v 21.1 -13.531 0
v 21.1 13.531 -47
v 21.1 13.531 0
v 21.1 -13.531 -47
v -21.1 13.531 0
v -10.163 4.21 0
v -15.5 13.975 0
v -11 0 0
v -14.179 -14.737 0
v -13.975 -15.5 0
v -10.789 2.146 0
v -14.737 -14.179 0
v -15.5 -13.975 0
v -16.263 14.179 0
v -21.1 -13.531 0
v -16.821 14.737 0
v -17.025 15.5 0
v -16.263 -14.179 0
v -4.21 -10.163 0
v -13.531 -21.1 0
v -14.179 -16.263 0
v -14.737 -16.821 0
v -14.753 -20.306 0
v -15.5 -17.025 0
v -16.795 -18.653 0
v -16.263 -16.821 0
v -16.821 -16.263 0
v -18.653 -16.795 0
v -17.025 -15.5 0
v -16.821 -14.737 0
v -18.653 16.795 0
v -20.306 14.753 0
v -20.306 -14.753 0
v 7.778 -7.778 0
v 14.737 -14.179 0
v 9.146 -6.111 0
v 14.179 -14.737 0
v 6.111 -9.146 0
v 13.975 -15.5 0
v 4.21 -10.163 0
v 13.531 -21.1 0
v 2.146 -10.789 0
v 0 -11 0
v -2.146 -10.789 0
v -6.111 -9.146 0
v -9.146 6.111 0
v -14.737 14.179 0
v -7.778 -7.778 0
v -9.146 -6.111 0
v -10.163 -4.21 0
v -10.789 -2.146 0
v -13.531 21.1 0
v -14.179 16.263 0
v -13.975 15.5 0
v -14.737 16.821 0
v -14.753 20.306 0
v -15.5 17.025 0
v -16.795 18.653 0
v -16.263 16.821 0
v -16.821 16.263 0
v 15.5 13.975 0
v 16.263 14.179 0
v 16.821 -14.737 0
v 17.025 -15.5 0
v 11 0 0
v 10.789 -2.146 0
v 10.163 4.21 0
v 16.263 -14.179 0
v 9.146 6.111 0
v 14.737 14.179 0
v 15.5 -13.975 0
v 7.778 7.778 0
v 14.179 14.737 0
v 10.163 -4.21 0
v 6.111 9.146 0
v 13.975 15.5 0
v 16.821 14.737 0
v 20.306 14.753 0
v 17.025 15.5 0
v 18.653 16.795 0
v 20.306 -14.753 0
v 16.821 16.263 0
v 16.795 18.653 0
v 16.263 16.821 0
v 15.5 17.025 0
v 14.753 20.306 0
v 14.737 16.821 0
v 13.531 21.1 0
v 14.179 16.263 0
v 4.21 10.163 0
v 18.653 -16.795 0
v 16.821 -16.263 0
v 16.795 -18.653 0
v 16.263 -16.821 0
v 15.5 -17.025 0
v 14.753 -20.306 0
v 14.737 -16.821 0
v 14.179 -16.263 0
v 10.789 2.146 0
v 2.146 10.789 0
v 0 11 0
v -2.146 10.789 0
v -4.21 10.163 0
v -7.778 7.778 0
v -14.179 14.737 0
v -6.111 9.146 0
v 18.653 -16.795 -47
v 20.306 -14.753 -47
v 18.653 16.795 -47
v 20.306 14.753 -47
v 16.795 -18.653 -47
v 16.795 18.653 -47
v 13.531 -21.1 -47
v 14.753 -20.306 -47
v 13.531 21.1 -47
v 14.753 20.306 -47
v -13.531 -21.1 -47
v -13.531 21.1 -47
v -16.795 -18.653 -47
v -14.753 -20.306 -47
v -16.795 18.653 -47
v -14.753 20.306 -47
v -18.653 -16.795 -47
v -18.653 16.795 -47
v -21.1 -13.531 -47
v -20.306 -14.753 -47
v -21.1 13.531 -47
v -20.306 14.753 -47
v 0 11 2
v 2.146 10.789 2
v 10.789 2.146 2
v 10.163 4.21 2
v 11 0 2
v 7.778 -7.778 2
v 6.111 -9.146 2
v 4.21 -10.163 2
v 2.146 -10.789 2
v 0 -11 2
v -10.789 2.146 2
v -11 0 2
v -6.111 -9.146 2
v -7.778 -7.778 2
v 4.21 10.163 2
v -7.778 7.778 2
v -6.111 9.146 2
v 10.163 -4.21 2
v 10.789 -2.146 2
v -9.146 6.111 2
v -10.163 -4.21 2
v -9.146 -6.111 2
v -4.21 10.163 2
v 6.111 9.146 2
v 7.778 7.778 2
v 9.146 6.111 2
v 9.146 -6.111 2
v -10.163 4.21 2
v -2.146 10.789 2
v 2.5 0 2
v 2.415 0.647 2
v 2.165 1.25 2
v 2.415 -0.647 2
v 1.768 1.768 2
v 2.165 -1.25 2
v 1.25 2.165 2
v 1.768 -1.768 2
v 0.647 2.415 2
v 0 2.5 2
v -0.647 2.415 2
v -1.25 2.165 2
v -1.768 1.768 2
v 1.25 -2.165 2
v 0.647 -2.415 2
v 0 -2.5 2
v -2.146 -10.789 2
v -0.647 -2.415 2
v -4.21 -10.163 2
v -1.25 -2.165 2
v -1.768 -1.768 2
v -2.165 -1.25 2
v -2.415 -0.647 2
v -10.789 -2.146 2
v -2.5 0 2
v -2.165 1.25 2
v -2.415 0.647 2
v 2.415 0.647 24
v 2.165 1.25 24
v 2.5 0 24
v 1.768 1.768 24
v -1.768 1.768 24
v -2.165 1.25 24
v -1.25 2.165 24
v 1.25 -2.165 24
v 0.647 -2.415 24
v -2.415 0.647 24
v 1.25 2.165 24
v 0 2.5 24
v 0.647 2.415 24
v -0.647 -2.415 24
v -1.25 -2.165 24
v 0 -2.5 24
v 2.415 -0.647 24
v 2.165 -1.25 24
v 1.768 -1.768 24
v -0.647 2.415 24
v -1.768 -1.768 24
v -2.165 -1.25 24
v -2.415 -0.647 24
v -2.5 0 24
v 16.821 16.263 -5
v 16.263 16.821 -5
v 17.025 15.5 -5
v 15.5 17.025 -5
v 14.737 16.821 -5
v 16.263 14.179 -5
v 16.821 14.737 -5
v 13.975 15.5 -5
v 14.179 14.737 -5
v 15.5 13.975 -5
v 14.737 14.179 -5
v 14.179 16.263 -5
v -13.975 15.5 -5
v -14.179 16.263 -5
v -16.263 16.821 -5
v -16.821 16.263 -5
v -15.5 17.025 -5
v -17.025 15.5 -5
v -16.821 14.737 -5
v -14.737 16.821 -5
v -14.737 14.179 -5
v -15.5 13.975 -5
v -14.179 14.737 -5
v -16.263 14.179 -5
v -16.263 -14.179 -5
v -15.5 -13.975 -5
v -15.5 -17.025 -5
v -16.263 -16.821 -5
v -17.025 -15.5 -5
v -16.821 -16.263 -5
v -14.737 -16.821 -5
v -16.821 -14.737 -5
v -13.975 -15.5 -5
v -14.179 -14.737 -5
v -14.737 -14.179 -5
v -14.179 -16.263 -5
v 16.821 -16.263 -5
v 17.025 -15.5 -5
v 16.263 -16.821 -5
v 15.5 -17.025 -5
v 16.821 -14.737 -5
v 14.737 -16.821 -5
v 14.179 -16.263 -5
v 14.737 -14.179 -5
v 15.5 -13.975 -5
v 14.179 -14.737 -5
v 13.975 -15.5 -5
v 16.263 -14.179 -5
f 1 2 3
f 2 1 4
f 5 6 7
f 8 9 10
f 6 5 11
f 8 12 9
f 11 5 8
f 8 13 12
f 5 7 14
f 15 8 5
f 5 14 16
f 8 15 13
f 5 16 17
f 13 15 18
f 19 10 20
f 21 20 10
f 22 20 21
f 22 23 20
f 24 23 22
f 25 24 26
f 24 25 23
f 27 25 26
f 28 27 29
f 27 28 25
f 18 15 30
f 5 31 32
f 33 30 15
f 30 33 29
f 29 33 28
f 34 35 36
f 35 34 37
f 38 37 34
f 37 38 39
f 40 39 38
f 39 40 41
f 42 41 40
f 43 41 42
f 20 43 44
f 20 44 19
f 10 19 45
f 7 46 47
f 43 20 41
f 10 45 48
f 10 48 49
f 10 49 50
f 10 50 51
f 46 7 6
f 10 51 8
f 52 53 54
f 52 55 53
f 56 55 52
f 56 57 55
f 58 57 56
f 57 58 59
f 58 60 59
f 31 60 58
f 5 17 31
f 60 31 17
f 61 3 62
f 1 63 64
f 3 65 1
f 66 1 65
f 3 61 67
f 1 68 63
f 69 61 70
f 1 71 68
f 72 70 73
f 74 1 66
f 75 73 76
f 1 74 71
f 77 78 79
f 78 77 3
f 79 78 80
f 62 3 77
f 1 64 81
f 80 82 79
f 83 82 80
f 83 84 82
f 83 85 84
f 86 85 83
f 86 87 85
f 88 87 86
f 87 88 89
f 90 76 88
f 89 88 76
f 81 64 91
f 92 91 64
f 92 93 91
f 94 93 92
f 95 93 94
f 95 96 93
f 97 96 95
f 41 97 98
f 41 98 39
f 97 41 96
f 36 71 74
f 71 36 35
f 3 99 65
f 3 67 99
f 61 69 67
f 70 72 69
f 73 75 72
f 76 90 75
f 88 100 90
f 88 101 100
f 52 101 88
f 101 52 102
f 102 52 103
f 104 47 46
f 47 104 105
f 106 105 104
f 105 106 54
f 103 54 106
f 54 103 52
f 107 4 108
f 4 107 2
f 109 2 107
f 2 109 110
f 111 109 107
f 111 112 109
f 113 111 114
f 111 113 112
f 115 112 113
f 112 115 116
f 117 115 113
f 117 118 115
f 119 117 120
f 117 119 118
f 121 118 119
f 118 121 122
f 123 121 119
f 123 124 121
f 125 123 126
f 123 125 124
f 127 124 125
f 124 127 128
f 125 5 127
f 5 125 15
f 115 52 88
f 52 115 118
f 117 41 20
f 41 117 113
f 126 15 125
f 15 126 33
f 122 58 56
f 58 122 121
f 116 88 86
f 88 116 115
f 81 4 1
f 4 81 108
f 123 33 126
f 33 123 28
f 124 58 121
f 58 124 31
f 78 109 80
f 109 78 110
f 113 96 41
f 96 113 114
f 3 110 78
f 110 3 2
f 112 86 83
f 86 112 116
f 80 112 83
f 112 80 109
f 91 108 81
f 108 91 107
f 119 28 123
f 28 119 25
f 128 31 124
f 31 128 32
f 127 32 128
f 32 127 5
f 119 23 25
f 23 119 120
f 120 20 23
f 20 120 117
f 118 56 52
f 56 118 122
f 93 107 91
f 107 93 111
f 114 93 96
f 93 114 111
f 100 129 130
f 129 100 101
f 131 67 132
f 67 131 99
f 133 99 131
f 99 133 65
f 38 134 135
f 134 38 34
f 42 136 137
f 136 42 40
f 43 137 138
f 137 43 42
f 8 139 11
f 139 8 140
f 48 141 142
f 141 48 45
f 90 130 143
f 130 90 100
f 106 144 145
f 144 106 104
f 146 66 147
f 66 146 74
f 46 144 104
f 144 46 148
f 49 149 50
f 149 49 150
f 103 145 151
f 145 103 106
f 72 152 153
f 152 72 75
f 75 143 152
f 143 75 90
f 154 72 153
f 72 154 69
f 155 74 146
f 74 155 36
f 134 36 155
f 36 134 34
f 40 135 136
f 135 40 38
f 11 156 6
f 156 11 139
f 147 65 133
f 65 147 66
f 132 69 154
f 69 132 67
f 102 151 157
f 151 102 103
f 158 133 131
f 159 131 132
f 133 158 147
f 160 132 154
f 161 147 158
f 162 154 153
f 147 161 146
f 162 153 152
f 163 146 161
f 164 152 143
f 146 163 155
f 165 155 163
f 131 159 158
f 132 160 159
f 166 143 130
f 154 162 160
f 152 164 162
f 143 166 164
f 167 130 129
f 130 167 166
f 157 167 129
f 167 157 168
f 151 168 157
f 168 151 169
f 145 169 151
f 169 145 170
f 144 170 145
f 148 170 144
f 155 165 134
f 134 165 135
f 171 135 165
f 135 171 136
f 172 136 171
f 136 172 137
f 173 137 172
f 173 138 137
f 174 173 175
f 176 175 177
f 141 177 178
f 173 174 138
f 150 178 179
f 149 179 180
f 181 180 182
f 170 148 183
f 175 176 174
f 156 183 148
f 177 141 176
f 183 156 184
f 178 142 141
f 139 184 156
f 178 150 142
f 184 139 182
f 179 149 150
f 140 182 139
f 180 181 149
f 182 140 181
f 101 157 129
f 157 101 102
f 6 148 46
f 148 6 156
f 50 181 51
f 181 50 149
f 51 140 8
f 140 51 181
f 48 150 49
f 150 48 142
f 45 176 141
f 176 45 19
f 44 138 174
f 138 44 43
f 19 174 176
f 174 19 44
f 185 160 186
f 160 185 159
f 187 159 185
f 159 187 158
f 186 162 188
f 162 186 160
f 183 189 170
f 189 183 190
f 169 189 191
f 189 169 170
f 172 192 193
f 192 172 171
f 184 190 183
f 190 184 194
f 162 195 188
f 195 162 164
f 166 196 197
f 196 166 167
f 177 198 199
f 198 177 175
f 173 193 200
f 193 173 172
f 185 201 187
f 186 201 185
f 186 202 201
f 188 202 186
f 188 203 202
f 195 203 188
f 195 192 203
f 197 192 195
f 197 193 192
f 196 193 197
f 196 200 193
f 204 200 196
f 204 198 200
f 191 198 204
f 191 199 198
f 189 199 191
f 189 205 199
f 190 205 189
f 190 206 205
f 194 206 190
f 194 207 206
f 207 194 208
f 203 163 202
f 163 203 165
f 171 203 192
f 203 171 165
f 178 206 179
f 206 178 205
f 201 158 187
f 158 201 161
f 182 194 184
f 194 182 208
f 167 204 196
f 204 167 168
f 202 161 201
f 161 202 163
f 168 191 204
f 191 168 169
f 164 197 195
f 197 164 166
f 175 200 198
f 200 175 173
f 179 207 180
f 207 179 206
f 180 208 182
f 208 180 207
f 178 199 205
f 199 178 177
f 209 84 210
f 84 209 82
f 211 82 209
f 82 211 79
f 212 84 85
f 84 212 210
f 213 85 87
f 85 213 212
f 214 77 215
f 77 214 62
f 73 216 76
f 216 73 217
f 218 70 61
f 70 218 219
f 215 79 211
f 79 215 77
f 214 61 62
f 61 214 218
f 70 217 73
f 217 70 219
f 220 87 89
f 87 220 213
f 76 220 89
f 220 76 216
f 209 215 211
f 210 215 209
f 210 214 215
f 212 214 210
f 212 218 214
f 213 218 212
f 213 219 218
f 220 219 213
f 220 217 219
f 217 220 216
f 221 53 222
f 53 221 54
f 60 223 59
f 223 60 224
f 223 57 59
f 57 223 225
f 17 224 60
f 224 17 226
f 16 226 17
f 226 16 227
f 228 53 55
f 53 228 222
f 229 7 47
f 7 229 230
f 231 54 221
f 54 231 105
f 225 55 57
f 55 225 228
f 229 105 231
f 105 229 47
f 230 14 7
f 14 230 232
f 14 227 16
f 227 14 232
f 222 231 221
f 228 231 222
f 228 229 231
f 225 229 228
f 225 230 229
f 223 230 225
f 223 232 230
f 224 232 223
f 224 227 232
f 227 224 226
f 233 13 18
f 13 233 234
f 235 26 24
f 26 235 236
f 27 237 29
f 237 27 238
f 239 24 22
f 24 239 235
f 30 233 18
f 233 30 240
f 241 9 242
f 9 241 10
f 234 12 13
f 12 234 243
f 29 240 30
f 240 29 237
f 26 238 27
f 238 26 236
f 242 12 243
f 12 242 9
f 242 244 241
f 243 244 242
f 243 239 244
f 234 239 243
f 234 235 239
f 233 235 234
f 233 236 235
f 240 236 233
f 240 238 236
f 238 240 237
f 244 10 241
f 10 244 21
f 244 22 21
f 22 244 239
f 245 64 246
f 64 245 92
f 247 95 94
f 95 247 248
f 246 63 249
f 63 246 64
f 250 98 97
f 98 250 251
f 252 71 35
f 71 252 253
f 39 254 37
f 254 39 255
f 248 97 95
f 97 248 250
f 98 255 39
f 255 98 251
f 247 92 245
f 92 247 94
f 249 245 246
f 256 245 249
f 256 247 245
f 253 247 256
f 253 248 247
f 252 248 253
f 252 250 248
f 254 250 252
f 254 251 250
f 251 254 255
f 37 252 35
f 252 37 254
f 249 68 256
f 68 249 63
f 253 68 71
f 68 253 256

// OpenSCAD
// file: configuration.scad
// Increase this if your slicer or printer make holes too tight.
extra_radius = 0.1;

// OD = outside diameter, corner to corner.
m3_nut_od = 6.1;
m3_nut_radius = m3_nut_od/2 + 0.2 + extra_radius;
m3_washer_radius = 3.5 + extra_radius;

// Major diameter of metric 3mm thread.
m3_major = 2.85;
m3_radius = m3_major/2 + extra_radius;
m3_wide_radius = m3_major/2 + extra_radius + 0.2;

// NEMA17 stepper motors.
motor_shaft_diameter = 5;
motor_shaft_radius = motor_shaft_diameter/2 + extra_radius;

// Frame brackets. M3x8mm screws work best with 3.6 mm brackets.
thickness = 3.6;

// OpenBeam or Misumi. Currently only 15x15 mm, but there is a plan
// to make models more parametric and allow 20x20 mm in the future.
extrusion = 15;

// Placement for the NEMA17 stepper motors.
motor_offset = 44;
motor_length = 47;
// main file
include <../include/configuration.scad>;

module nema17() {
  // NEMA 17 stepper motor.
  difference() {
    union() {
      translate([0, 0, -motor_length/2]) intersection() {
        cube([42.2, 42.2, motor_length], center=true);
        cylinder(r=25.1, h=motor_length+1, center=true, $fn=60);
      }
      cylinder(r=11, h=4, center=true, $fn=32);
      cylinder(r=2.5, h=48, center=true, $fn=24);
    }
    for (a = [0:90:359]) {
      rotate([0, 0, a]) translate([15.5, 15.5, 0])
        cylinder(r=m3_radius, h=10, center=true, $fn=12);
    }
  }
}

nema17();
